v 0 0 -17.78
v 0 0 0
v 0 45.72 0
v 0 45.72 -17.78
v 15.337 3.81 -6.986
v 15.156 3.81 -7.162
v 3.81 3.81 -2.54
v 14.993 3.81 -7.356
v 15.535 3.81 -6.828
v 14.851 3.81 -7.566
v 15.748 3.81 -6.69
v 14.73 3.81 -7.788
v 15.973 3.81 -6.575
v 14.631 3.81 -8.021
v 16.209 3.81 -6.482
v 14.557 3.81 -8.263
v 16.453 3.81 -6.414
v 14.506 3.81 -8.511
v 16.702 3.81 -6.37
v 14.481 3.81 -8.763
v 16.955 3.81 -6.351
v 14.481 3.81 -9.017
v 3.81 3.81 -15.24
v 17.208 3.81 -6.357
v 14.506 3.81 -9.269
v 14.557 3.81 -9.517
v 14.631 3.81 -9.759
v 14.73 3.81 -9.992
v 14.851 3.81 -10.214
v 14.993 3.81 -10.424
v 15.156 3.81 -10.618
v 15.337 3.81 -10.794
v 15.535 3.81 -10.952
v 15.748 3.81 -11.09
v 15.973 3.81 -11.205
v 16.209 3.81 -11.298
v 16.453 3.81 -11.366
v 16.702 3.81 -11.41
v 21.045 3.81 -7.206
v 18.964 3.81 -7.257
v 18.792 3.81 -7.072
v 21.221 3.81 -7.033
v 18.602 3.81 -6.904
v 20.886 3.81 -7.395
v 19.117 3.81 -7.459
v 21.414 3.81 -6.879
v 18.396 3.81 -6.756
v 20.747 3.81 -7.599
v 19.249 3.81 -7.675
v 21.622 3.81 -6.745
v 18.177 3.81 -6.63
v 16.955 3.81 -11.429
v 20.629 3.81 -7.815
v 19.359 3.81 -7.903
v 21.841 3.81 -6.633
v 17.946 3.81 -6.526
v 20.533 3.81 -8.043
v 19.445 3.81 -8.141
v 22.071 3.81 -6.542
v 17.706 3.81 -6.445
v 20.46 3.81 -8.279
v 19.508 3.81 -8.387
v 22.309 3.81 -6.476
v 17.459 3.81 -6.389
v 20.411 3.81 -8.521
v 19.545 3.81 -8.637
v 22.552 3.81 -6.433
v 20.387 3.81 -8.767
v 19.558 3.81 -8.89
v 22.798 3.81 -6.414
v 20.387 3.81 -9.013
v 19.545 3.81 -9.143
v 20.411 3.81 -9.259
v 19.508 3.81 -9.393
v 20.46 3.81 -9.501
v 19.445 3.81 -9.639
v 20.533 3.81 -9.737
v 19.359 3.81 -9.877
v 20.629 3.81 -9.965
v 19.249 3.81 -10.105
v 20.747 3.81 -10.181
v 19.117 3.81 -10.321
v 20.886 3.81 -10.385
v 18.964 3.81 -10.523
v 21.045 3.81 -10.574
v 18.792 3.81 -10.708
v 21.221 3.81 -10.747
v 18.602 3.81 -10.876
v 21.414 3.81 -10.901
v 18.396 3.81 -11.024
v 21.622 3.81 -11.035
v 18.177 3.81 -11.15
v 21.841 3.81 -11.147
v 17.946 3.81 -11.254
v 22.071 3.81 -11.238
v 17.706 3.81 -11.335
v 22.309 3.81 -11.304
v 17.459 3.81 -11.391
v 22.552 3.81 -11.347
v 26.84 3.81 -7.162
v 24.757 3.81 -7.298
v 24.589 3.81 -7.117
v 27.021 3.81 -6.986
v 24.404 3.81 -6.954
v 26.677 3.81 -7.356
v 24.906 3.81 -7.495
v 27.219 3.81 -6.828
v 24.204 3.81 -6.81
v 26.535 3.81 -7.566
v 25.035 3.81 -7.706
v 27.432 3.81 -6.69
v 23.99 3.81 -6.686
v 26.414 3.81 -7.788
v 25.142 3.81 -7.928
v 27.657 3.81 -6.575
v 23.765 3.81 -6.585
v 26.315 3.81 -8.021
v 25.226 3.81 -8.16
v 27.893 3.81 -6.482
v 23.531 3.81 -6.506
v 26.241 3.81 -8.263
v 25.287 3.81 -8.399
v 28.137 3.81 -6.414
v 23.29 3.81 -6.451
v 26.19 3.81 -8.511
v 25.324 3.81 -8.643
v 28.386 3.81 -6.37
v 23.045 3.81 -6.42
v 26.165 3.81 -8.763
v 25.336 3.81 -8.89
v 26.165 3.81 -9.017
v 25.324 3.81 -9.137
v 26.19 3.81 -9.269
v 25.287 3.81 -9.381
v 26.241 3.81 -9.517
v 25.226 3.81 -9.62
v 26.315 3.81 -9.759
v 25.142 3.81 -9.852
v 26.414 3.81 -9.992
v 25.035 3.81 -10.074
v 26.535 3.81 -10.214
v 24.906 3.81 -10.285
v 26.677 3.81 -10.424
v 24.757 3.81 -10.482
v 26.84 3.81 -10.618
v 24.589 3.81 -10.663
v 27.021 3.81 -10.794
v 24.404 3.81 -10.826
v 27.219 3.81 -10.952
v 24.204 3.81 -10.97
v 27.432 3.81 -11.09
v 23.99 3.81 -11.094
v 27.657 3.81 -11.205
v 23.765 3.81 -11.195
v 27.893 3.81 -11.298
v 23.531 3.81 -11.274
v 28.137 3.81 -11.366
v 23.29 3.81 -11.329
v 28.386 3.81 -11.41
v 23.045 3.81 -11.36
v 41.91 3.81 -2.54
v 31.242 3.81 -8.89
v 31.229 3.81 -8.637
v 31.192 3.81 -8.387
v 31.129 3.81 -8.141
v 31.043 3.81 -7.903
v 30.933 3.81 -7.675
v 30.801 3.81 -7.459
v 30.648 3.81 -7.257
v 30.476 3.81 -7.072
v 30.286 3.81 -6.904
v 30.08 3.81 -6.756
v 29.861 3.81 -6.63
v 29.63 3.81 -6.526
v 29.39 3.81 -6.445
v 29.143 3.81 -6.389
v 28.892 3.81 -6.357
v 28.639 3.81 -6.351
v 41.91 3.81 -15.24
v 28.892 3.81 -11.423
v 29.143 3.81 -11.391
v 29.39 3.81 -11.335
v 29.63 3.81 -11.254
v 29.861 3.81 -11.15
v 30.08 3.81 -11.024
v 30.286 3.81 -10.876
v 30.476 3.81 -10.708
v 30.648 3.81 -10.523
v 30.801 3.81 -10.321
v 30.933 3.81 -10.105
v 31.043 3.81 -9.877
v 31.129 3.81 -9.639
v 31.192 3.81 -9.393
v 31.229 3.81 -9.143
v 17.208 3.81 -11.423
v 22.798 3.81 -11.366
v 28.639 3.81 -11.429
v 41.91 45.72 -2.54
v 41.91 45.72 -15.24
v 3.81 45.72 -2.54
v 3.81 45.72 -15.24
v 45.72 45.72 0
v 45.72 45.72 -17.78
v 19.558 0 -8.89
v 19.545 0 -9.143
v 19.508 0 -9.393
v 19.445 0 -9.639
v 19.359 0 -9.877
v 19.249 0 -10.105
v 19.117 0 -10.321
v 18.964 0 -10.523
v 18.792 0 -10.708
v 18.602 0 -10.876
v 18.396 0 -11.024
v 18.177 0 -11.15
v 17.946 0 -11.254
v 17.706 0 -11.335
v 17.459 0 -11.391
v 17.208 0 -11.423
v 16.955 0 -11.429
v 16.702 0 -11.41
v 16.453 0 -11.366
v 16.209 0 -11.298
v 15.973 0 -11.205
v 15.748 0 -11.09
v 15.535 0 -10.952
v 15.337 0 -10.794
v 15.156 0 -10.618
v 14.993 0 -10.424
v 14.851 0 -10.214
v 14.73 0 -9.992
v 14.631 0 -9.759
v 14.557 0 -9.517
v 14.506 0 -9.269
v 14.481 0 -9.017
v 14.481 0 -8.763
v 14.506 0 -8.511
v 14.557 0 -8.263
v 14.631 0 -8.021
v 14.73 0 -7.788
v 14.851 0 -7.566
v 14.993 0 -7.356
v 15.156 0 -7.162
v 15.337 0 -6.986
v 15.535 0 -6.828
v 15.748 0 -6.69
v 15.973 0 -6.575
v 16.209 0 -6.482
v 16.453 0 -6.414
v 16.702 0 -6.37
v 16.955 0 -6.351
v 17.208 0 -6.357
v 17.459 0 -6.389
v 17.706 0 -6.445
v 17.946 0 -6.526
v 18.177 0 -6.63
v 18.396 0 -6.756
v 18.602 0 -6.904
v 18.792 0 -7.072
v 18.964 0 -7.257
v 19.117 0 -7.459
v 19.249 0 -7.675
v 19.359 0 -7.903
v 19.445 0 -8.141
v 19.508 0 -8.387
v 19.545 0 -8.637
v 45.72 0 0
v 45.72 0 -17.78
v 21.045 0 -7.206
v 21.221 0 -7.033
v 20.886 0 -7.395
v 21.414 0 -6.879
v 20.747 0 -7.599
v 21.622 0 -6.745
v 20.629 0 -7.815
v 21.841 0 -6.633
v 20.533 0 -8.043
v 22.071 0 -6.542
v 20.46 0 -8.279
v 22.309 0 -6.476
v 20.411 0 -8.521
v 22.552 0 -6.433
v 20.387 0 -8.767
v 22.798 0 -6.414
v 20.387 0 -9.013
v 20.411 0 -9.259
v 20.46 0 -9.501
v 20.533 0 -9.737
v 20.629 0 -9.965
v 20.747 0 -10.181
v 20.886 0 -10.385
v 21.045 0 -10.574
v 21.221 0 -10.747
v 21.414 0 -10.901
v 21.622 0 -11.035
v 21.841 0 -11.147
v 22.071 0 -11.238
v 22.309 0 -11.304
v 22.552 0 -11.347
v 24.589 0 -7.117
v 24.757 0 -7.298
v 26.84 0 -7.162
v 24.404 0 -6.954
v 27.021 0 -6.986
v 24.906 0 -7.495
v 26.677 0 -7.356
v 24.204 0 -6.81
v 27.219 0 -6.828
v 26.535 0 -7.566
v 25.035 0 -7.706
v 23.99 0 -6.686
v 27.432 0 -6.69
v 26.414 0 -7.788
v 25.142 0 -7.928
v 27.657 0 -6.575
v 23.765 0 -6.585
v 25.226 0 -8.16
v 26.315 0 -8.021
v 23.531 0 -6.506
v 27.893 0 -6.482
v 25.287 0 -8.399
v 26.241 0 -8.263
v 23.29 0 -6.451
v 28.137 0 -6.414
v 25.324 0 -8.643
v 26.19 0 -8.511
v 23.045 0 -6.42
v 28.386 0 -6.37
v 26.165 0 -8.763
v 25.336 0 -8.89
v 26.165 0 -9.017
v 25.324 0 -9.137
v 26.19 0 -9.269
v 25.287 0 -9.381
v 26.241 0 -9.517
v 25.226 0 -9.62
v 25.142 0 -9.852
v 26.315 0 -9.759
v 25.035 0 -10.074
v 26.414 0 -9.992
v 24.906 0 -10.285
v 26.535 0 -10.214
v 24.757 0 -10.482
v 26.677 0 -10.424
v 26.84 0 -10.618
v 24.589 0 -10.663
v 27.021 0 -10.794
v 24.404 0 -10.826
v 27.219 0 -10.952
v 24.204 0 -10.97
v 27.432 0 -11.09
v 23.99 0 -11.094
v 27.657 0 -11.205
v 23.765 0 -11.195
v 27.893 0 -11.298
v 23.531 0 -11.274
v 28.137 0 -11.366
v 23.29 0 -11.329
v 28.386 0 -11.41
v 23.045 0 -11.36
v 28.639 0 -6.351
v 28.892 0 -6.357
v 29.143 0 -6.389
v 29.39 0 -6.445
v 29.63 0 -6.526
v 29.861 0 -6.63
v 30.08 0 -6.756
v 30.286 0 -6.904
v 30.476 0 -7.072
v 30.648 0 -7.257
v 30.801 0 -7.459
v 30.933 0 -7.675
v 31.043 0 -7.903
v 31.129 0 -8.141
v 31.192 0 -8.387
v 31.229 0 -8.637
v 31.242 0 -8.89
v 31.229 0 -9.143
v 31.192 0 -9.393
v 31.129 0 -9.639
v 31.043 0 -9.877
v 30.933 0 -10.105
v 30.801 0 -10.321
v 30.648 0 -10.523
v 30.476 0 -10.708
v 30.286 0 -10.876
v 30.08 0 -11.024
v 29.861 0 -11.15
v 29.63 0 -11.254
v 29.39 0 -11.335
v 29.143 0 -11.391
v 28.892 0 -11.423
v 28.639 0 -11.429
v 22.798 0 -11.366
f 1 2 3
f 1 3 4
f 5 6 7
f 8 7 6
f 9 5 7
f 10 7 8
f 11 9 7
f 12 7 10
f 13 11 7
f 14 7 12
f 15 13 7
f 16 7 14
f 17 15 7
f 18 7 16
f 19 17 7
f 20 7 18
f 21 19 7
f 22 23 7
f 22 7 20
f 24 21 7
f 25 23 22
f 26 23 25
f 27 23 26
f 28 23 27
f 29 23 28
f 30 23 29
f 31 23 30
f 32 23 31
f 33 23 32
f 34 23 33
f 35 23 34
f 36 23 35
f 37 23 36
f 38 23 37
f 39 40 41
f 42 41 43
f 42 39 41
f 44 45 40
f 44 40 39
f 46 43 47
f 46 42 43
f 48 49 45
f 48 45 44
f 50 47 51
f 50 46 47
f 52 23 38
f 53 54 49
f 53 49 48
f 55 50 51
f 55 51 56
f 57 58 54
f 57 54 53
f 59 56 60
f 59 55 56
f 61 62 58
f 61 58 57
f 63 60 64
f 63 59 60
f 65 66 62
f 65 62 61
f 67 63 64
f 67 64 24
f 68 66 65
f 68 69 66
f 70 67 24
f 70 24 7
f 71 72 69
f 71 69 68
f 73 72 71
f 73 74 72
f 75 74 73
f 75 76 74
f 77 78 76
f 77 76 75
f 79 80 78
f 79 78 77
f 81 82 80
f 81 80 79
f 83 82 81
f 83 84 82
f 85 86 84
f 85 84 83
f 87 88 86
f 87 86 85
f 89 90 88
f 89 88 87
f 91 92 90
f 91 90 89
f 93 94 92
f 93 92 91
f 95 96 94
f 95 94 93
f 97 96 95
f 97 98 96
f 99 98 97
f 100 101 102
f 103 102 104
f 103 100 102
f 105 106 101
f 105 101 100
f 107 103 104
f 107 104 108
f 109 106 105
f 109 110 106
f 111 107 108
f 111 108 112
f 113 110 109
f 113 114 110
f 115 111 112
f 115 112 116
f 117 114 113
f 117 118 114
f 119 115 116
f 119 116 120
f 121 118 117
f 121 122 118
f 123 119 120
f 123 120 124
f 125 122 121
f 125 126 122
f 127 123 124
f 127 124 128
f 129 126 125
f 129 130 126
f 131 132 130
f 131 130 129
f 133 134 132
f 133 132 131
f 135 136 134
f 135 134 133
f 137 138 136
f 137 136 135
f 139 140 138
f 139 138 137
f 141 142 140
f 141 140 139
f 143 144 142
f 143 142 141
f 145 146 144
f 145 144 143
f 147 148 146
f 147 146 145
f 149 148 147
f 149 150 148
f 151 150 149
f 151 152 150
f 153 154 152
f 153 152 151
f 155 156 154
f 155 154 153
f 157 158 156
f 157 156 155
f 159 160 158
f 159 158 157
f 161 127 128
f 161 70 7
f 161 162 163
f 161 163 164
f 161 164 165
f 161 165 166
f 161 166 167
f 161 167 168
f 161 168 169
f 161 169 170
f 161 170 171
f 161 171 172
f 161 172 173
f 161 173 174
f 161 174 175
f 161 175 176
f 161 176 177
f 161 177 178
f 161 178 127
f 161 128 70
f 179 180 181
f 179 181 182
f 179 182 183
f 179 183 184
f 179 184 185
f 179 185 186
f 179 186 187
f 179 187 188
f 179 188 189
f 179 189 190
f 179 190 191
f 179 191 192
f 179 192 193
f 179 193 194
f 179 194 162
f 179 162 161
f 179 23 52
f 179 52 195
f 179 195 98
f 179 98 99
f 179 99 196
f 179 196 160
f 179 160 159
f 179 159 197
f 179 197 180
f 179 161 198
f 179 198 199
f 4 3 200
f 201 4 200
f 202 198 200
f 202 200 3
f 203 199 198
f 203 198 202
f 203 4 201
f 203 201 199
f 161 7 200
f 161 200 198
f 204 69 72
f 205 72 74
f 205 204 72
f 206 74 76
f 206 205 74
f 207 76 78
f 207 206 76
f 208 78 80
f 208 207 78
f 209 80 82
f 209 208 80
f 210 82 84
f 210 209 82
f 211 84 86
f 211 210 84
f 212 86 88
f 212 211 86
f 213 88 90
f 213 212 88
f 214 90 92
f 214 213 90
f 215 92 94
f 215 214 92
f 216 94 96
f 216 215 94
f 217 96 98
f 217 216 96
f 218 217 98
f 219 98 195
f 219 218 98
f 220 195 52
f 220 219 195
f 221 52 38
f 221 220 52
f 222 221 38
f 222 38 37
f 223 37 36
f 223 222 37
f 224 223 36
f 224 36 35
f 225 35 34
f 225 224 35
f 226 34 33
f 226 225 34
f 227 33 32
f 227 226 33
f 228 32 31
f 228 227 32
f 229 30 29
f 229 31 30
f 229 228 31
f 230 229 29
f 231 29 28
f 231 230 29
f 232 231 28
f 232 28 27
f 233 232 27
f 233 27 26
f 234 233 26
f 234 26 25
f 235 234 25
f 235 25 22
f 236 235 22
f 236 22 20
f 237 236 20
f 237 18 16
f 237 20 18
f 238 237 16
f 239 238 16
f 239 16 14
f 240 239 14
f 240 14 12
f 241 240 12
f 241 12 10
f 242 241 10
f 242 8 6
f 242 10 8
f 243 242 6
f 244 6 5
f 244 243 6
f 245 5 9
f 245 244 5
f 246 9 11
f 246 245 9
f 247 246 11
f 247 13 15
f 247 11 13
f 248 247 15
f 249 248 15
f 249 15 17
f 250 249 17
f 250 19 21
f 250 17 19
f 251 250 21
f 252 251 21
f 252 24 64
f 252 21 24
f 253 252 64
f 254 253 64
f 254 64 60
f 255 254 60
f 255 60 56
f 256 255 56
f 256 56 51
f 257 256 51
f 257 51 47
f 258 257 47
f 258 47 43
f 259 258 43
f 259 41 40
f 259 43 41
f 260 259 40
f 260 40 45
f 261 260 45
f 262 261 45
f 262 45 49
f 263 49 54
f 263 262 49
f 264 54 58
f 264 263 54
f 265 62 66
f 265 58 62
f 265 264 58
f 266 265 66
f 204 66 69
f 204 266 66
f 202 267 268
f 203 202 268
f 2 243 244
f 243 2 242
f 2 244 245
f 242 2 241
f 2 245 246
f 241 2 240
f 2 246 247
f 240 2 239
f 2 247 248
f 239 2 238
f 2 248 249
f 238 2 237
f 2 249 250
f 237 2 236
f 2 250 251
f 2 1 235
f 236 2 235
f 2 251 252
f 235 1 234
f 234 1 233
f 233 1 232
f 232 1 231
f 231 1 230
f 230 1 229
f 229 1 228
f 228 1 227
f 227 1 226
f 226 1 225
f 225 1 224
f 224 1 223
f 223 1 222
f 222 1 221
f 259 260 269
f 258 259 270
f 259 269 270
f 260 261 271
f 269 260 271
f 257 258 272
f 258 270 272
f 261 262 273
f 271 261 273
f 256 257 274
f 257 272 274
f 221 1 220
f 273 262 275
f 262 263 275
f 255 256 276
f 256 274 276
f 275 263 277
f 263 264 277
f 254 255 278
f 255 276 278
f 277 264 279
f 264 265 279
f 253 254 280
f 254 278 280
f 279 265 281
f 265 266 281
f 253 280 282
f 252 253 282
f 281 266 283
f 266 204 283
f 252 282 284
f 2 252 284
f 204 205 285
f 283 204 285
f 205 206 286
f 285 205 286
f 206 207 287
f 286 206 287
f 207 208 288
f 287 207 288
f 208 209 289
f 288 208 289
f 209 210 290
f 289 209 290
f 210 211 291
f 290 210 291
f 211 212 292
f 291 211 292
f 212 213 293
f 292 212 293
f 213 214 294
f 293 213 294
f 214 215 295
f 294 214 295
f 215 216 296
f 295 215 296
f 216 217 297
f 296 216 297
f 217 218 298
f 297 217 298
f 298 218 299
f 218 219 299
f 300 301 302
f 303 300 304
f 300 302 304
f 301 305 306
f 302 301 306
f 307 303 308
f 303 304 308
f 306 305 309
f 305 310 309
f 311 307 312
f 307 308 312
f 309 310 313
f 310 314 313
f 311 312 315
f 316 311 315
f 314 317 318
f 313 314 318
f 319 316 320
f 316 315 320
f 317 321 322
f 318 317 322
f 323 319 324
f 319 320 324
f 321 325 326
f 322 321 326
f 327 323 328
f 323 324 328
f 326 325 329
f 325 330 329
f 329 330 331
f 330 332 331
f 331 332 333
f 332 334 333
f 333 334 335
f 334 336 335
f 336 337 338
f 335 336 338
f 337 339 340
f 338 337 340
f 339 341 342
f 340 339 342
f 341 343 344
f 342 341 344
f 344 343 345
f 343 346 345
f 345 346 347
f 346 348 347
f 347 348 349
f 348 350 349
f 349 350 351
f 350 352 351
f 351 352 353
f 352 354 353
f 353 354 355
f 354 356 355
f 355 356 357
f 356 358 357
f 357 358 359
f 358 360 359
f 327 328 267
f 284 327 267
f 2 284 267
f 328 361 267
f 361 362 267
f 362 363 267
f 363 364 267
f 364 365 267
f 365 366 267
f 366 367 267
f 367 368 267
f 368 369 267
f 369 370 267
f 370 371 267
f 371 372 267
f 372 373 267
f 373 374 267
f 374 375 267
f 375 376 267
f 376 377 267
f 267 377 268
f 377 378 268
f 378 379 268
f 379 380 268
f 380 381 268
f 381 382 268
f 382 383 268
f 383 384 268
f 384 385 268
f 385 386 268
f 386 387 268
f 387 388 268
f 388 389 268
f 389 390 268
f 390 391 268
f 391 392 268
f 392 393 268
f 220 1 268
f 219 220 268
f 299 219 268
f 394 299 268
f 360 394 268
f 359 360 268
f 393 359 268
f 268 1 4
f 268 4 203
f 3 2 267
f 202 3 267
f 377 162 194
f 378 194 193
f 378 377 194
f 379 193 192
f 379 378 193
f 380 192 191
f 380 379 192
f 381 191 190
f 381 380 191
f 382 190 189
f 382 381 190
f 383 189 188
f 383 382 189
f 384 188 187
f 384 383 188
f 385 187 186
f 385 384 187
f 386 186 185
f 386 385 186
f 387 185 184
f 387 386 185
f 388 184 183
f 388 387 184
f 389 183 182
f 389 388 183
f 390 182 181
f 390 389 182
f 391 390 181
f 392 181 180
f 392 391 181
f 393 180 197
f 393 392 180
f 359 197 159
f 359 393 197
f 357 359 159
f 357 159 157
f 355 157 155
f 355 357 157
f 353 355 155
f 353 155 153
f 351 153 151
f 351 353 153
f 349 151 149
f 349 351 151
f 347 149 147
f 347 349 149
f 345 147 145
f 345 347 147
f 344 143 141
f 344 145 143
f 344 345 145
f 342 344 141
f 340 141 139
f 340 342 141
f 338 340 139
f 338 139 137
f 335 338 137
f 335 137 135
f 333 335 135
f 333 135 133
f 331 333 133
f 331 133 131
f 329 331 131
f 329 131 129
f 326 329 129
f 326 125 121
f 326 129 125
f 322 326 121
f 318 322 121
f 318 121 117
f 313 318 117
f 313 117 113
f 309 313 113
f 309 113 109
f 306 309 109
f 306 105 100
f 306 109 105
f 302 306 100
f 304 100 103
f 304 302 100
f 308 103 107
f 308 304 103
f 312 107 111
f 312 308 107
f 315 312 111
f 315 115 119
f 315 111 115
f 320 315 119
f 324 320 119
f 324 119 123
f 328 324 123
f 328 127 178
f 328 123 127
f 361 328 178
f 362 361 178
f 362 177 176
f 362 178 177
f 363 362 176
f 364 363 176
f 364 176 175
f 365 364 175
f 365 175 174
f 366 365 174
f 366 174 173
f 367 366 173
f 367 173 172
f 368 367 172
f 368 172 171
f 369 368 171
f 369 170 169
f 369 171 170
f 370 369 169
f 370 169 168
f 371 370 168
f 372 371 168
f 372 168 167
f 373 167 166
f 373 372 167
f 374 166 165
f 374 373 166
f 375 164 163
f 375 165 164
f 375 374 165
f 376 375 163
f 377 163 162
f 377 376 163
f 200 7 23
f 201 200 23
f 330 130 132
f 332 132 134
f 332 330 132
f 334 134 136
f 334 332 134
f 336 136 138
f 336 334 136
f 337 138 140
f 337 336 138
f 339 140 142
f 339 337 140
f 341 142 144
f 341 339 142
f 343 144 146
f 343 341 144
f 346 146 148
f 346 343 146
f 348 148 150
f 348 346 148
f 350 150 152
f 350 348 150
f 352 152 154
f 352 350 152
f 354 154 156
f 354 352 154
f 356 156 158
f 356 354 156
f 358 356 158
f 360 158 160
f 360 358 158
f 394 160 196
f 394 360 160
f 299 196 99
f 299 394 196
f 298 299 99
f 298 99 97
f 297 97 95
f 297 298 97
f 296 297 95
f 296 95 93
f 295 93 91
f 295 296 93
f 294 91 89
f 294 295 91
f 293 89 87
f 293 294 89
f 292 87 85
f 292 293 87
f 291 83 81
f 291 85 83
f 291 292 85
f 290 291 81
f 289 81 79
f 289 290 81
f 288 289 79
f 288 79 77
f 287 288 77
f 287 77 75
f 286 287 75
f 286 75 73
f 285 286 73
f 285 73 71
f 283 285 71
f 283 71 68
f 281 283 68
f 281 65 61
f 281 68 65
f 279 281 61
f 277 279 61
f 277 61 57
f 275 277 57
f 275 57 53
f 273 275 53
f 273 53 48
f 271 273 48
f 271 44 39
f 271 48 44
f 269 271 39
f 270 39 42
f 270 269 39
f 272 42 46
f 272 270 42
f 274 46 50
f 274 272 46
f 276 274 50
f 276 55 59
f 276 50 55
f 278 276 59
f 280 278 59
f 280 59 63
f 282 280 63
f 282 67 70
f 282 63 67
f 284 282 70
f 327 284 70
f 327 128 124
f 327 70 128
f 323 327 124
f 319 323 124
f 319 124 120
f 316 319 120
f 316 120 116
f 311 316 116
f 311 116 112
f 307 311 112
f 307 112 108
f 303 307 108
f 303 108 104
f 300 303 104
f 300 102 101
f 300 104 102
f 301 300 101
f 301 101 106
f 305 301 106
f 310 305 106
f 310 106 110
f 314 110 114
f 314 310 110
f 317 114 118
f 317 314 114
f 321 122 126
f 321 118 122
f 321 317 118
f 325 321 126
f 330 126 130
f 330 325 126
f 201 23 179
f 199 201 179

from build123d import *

# Parameters (mm, degrees)
SKETCH1_W           = 45.72
SKETCH1_H           = 17.78
BOSS_EXTRUDE1_DEPTH = 45.72
SKETCH2_W           = 38.1
SKETCH2_H           = 12.7
CUT_EXTRUDE1_DEPTH  = 41.91
SKETCH3_R           = 2.4765
SKETCH3_R_2         = 2.54
CUT_EXTRUDE2_DEPTH  = 46.72


with BuildPart() as part:
    # Sketch1 → Boss-Extrude1 (new body)
    with BuildSketch(Plane(origin=(0, 0, 0), x_dir=(1, 0, 0), z_dir=(0, 1, 0))):
        with Locations((22.86, 8.89)):
            Rectangle(SKETCH1_W, SKETCH1_H)
    extrude(amount=BOSS_EXTRUDE1_DEPTH)

    # Sketch2 → Cut-Extrude1 (cut)
    with BuildSketch(Plane(origin=(0, 45.72, 0), x_dir=(1, 0, 0), z_dir=(0, 1, 0))):
        with Locations((22.86, 8.89)):
            Rectangle(SKETCH2_W, SKETCH2_H)
    extrude(amount=-CUT_EXTRUDE1_DEPTH, mode=Mode.SUBTRACT)

    # Sketch3 → Cut-Extrude2 (cut, through all)
    with BuildSketch(Plane(origin=(0, 0, 0), x_dir=(1, 0, 0), z_dir=(0, 1, 0))):
        with Locations((22.86, 8.89)):
            Circle(SKETCH3_R)
        with Locations((17.018, 8.89)):
            Circle(SKETCH3_R_2)
        with Locations((28.702, 8.89)):
            Circle(SKETCH3_R_2)
    extrude(amount=CUT_EXTRUDE2_DEPTH, mode=Mode.SUBTRACT)


solid = part.part
